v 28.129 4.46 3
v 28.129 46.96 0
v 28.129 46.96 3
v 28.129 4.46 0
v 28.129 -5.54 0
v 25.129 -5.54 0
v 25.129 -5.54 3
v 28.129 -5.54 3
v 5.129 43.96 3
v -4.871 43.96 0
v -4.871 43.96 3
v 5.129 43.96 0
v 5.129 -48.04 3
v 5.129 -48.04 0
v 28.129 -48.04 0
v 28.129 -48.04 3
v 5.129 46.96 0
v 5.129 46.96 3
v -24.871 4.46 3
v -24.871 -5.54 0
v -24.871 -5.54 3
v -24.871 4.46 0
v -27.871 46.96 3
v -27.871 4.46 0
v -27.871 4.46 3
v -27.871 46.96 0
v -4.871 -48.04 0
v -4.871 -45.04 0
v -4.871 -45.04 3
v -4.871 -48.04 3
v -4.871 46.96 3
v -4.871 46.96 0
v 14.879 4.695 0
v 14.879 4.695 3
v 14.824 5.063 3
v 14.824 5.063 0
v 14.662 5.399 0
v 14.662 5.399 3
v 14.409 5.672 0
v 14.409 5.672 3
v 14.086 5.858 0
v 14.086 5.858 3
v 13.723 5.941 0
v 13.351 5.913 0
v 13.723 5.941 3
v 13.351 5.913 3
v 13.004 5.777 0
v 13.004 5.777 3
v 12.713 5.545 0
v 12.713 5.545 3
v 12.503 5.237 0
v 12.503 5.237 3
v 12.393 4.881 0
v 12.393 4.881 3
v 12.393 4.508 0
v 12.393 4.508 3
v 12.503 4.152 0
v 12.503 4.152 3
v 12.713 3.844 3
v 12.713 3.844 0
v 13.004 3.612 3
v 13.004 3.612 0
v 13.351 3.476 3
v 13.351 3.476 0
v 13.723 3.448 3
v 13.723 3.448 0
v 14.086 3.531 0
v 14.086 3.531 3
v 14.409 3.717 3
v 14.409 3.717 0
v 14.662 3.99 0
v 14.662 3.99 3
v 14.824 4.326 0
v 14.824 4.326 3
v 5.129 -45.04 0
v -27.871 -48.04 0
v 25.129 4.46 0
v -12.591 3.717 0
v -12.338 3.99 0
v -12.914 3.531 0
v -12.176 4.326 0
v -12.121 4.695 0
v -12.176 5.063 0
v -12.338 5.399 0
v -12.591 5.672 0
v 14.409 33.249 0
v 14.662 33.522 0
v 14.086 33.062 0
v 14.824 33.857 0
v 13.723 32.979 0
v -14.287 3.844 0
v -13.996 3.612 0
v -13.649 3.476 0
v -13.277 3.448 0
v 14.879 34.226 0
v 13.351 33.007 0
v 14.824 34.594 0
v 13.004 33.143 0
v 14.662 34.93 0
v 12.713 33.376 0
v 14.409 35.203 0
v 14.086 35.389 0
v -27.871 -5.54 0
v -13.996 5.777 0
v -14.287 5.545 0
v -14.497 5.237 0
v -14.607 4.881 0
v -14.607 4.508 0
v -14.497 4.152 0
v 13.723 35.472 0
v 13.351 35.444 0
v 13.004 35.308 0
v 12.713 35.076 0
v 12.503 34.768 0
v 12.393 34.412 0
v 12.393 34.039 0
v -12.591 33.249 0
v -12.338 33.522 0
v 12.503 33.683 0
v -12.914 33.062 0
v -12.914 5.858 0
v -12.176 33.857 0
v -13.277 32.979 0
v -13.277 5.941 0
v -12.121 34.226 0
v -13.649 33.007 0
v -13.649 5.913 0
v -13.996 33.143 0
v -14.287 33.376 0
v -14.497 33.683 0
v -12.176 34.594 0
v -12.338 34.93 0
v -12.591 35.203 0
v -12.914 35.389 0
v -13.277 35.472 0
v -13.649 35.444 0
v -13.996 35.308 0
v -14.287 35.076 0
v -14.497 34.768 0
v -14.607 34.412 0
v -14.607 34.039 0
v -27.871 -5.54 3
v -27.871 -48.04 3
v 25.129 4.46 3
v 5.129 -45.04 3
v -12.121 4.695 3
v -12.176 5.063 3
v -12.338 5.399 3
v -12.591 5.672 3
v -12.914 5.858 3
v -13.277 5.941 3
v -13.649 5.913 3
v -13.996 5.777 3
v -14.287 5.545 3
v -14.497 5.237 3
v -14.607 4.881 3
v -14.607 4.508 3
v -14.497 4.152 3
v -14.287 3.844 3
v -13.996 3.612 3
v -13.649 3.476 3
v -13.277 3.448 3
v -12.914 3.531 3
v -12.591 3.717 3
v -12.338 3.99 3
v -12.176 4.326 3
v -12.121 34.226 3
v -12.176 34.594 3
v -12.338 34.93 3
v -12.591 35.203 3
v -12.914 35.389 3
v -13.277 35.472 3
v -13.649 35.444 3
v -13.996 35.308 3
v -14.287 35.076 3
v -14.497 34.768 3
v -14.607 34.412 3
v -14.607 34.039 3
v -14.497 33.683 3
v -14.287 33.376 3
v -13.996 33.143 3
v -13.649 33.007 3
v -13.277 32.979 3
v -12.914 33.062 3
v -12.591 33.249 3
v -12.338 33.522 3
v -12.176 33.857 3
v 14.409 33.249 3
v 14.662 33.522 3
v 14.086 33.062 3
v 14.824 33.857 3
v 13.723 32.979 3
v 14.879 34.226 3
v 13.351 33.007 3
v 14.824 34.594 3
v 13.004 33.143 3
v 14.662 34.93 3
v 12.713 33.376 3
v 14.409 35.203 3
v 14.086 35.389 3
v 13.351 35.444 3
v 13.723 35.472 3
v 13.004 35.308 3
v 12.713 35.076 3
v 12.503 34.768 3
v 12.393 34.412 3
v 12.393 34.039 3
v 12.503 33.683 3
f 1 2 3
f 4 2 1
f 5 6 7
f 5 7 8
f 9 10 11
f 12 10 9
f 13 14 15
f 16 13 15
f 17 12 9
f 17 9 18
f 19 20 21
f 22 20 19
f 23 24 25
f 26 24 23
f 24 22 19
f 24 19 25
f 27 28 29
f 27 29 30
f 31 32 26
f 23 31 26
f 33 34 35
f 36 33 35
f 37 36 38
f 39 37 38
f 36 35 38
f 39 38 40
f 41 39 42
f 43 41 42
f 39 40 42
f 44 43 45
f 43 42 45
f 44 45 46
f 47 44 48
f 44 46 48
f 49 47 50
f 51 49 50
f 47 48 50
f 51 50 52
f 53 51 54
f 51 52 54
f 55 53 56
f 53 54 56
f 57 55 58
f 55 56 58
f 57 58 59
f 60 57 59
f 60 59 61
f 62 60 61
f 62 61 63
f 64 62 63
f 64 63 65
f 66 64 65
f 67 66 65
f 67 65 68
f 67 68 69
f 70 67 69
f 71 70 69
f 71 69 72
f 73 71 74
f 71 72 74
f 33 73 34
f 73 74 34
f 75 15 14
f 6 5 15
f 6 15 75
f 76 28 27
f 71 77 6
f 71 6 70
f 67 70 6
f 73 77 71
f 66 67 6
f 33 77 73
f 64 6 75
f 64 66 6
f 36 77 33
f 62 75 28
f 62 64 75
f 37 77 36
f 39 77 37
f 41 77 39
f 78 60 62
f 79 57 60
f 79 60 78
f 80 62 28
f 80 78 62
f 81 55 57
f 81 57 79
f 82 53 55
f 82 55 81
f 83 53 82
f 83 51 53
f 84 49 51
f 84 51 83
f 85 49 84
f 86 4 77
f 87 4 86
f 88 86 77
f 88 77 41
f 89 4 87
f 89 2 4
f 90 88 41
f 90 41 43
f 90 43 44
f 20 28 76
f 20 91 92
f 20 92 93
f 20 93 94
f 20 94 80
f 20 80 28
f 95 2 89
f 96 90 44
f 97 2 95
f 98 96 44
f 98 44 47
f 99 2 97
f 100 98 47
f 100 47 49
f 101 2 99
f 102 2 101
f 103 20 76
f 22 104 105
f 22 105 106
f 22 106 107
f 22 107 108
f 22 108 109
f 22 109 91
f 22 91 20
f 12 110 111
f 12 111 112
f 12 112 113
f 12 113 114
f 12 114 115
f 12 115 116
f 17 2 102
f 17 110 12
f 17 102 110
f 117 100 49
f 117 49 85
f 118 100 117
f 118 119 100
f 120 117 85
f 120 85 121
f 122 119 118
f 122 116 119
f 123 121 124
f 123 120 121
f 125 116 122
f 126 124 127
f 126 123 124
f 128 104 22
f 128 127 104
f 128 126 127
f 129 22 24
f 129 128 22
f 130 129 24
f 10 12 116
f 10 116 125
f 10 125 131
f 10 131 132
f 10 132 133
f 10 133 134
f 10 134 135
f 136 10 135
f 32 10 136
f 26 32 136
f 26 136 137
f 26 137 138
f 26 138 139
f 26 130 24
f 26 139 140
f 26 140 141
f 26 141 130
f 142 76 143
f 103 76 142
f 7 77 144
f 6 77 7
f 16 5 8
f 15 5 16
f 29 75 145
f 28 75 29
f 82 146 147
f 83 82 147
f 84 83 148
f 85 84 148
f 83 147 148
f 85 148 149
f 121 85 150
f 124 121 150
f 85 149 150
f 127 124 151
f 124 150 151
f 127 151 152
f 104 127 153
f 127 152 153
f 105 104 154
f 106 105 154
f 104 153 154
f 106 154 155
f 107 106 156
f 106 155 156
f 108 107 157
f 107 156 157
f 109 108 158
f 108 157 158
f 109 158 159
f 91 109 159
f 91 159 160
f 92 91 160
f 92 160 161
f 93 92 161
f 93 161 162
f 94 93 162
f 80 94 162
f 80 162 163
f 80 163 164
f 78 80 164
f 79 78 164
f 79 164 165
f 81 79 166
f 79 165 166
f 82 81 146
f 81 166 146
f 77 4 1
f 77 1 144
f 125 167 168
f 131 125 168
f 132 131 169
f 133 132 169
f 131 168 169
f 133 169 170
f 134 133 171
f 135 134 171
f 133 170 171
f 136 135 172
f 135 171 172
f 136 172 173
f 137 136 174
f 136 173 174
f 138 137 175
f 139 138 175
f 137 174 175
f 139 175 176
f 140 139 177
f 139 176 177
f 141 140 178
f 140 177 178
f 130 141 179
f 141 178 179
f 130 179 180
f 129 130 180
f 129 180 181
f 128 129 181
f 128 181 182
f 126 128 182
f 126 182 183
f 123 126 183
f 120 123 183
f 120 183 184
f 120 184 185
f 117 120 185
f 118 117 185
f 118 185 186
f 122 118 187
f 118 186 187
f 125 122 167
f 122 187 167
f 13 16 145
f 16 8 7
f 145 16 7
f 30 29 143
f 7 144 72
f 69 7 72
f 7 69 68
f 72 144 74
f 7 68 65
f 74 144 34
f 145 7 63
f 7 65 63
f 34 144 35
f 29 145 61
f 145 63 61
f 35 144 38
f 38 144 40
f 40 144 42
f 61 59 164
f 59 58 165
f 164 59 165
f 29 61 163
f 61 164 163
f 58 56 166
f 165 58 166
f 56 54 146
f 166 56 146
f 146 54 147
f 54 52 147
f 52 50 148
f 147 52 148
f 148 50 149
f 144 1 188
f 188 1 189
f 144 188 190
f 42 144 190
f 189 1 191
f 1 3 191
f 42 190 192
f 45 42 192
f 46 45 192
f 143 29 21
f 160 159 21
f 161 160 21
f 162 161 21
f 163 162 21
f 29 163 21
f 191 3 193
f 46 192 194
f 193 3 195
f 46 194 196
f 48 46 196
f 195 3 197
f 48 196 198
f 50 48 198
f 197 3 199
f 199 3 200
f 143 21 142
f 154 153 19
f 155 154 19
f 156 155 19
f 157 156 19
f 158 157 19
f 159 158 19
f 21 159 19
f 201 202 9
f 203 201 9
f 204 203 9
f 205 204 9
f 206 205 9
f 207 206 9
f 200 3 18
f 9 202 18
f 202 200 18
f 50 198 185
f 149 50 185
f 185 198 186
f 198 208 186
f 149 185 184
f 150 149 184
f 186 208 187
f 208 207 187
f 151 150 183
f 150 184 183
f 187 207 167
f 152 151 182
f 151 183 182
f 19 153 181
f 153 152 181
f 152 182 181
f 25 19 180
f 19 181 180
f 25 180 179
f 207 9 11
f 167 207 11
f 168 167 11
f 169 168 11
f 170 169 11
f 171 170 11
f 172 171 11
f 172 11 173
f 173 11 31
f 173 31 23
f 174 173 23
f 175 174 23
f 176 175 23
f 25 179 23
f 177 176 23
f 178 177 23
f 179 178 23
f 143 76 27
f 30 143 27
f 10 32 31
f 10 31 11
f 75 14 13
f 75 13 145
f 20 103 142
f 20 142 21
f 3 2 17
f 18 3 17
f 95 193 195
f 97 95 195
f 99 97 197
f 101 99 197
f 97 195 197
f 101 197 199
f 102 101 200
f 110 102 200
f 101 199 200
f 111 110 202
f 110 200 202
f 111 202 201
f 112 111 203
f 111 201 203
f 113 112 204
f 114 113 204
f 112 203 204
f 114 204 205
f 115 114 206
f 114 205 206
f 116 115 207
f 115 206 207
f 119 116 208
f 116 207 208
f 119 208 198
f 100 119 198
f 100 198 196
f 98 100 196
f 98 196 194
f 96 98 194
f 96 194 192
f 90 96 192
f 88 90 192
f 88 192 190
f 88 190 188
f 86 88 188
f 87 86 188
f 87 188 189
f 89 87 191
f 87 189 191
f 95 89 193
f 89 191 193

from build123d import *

# Parameters (mm, degrees)
BOSS_EXTRUDE1_DEPTH = 3
SKETCH2_R           = 1.25
CUT_EXTRUDE1_DEPTH  = 3


with BuildPart() as part:
    # Sketch1 → Boss-Extrude1 (new body)
    with BuildSketch(Plane.XY):
        Polygon((28.129269299, -5.5398317), (28.129269299, -48.0398317), (25.129269299, -48.0398317), (5.129269299, -48.0398317), (5.129269299, -45.0398317), (-4.870730701, -45.0398317), (-4.870730701, -48.0398317), (-24.870730701, -48.0398317), (-27.870730701, -48.0398317), (-27.870730701, -5.5398317), (-24.870730701, -5.5398317), (-24.870730701, 4.4601683), (-27.870730701, 4.4601683), (-27.870730701, 46.9601683), (-24.870730701, 46.9601683), (-4.870730701, 46.9601683), (-4.870730701, 43.9601683), (5.129269299, 43.9601683), (5.129269299, 46.9601683), (25.129269299, 46.9601683), (28.129269299, 46.9601683), (28.129269299, 4.4601683), (25.129269299, 4.4601683), (25.129269299, -5.5398317), align=None)
    extrude(amount=BOSS_EXTRUDE1_DEPTH)

    # Sketch2 → Cut-Extrude1 (cut)
    with BuildSketch(Plane.XY.offset(3)):
        with Locations((13.629269299, 34.2257933)):
            Circle(SKETCH2_R)
        with Locations((13.629269299, 4.6945433)):
            Circle(SKETCH2_R)
        with Locations((-13.370730701, 34.2257933)):
            Circle(SKETCH2_R)
        with Locations((-13.370730701, 4.6945433)):
            Circle(SKETCH2_R)
    extrude(amount=-CUT_EXTRUDE1_DEPTH, mode=Mode.SUBTRACT)


solid = part.part
